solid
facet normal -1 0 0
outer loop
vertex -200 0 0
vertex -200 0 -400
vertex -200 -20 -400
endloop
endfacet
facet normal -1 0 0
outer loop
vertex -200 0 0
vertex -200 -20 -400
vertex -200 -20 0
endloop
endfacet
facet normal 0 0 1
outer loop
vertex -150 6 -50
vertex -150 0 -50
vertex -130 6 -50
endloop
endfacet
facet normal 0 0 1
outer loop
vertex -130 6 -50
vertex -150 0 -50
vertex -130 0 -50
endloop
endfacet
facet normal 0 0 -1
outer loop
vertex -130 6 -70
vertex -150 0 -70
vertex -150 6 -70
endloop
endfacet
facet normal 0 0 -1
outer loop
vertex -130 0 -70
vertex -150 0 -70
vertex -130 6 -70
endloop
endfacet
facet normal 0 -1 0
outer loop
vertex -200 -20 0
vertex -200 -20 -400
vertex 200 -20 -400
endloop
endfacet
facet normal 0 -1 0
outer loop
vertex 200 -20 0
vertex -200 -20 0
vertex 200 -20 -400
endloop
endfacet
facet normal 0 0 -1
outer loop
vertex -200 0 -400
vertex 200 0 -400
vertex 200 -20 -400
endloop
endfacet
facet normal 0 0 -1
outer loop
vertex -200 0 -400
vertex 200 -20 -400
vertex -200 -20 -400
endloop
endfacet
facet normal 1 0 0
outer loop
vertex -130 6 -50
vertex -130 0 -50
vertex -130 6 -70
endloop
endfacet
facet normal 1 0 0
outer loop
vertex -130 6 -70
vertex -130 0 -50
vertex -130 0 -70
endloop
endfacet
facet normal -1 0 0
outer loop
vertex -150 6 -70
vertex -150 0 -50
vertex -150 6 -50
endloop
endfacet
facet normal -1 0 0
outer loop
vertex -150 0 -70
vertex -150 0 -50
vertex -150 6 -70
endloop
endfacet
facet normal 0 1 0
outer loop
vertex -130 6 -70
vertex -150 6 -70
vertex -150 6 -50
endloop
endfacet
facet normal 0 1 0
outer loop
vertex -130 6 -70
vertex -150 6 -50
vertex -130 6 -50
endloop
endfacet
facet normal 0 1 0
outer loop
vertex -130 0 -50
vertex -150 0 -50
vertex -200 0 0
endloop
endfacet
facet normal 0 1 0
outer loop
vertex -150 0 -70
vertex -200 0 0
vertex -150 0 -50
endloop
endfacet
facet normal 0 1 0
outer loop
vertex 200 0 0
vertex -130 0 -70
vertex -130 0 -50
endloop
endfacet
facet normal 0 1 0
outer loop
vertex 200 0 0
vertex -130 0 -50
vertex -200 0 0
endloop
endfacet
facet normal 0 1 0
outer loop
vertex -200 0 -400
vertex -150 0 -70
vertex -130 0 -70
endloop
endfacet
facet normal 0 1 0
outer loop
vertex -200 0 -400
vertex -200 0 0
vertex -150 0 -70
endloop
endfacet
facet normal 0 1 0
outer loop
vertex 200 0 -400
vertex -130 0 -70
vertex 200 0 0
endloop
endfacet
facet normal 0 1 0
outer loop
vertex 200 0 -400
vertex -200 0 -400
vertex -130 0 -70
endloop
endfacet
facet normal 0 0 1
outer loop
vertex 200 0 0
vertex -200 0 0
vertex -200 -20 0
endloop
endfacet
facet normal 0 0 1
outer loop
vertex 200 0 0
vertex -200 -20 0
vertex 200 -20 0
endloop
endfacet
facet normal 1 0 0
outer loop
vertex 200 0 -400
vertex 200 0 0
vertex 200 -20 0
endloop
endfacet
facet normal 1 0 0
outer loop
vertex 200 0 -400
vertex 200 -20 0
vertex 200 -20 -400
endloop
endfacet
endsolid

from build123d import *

# Parameters (mm, degrees)
BOSS_EXTRU_1_DEPTH = 20
ESQUISSE1_3_W      = 20
ESQUISSE1_3_H      = 20
BOSS_EXTRU_2_DEPTH = 6


with BuildPart() as part:
    # Esquisse1 → Boss.-Extru.1 (new body)
    with BuildSketch(Plane(origin=(0, 0, 0), x_dir=(1, 0, 0), z_dir=(0, 1, 0))):
        Polygon((0, 0), (200, 0), (200, 400), (-200, 400), (-200, 0), align=None)
    extrude(amount=-BOSS_EXTRU_1_DEPTH)

    # Esquisse1<3> → Boss.-Extru.2 (add)
    with BuildSketch(Plane(origin=(0, 0, 0), x_dir=(1, 0, 0), z_dir=(0, 1, 0))):
        with Locations((-140, 60)):
            Rectangle(ESQUISSE1_3_W, ESQUISSE1_3_H)
    extrude(amount=BOSS_EXTRU_2_DEPTH)


solid = part.part
